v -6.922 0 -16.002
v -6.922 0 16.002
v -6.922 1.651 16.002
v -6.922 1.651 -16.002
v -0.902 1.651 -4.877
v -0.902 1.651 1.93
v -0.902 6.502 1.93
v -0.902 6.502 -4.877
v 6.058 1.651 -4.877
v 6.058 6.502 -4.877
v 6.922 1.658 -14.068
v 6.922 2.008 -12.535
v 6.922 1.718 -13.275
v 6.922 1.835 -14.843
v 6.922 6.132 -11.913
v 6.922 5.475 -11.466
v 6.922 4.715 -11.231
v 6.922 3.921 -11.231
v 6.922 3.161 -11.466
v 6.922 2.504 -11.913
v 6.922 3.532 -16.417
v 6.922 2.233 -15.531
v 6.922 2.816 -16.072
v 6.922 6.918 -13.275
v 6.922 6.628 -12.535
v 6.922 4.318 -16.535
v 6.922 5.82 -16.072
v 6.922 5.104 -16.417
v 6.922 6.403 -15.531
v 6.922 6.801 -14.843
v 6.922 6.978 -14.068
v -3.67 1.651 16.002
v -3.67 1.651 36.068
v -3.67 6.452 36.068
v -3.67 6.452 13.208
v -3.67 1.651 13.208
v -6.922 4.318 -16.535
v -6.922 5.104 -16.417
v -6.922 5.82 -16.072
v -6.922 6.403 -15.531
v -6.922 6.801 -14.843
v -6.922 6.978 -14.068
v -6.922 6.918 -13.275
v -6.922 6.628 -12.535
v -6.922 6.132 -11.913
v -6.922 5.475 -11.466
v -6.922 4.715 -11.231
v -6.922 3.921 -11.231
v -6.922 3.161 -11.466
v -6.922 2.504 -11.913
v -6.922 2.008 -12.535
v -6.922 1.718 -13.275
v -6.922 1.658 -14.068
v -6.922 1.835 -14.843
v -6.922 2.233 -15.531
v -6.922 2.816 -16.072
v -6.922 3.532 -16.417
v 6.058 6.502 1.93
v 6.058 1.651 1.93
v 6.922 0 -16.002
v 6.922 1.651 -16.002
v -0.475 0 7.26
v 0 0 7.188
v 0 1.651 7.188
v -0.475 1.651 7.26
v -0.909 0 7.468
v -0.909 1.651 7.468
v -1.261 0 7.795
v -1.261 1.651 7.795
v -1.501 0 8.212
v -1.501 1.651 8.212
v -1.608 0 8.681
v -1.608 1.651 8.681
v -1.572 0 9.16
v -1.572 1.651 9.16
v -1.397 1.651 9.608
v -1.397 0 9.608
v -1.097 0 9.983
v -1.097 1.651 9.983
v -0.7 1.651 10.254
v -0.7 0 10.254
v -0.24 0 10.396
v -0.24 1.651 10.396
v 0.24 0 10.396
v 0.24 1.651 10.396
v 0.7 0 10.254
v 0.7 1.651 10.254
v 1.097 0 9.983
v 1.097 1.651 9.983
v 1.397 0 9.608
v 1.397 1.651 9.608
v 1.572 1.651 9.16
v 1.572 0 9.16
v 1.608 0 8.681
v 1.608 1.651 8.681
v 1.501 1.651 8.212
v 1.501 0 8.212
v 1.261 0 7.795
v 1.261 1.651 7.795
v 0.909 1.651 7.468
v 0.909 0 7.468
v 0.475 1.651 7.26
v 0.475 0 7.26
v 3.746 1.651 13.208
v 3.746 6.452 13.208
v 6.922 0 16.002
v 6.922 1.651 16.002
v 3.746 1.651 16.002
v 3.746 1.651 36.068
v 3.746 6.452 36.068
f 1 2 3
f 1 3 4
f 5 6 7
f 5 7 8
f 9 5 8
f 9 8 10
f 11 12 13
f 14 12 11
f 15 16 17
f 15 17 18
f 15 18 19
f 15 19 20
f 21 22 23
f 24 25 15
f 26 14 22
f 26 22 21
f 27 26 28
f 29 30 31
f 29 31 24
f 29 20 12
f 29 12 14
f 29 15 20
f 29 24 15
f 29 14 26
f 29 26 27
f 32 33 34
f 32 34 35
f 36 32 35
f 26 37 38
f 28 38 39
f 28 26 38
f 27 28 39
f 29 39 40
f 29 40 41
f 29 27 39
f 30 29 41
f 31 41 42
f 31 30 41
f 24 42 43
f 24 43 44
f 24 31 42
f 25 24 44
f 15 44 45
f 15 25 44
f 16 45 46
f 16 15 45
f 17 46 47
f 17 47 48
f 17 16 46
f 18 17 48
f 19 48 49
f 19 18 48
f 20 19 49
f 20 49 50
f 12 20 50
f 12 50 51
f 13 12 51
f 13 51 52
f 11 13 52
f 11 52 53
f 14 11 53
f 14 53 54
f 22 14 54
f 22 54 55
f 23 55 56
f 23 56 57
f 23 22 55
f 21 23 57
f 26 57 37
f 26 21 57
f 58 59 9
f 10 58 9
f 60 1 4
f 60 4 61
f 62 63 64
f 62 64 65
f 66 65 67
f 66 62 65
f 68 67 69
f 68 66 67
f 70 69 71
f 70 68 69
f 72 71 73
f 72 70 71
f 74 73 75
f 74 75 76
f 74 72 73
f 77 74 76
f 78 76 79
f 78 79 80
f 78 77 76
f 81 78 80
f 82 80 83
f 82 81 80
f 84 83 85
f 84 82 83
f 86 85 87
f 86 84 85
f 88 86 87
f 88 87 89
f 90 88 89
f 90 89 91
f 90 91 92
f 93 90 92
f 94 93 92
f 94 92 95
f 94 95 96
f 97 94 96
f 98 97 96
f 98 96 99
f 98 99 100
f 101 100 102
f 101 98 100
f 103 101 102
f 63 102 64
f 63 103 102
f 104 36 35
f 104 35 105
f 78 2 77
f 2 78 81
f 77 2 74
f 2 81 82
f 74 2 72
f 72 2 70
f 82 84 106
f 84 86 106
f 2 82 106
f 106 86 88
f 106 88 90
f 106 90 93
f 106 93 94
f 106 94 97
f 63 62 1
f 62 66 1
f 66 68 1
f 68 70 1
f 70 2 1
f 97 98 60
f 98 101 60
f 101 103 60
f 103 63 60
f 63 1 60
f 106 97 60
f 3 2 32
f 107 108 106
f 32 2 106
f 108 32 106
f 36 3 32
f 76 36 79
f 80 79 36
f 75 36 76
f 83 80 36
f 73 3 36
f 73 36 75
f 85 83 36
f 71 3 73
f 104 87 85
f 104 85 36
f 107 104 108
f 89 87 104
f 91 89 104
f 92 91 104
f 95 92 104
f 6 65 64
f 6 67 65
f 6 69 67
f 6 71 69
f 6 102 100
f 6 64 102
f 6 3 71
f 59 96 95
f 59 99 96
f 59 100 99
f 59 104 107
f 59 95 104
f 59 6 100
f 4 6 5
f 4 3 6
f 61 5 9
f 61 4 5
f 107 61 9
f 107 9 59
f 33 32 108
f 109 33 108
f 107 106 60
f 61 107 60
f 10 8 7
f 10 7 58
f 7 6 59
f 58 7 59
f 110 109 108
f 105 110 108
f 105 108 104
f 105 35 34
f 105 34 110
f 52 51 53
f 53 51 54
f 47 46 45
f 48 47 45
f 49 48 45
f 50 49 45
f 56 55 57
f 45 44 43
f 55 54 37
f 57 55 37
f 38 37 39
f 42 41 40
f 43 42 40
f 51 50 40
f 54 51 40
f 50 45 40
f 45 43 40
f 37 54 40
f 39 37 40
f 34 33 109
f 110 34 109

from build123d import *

# Parameters (mm, degrees)
SKETCH1_W           = 13.843
SKETCH1_H           = 32.004
SKETCH1_R           = 1.6129
BOSS_EXTRUDE1_DEPTH = 1.651
SKETCH2_R           = 2.667
BOSS_EXTRUDE2_DEPTH = 13.843
SKETCH3_W           = 6.9596
SKETCH3_H           = 6.8072
BOSS_EXTRUDE3_DEPTH = 4.8514
SKETCH4_W           = 7.4168
SKETCH4_H           = 22.86
BOSS_EXTRUDE4_DEPTH = 4.8006


with BuildPart() as part:
    # Sketch1 → Boss-Extrude1 (new body)
    with BuildSketch(Plane(origin=(0, 0, 0), x_dir=(1, 0, 0), z_dir=(0, 1, 0))):
        Rectangle(SKETCH1_W, SKETCH1_H)
        with Locations(Location((0, -8.8011, 0), (0, 0, 90))):
            Circle(SKETCH1_R, mode=Mode.SUBTRACT)
    extrude(amount=BOSS_EXTRUDE1_DEPTH)

    # Sketch3 → Boss-Extrude3 (add)
    with BuildSketch(Plane(origin=(0, 1.651, 0), x_dir=(1, 0, 0), z_dir=(0, 1, 0))):
        with Locations((2.5781, 1.4732)):
            Rectangle(SKETCH3_W, SKETCH3_H)
    extrude(amount=BOSS_EXTRUDE3_DEPTH)

    # Sketch4 → Boss-Extrude4 (add)
    with BuildSketch(Plane(origin=(0, 1.651, 0), x_dir=(1, 0, 0), z_dir=(0, 1, 0))):
        with Locations((0.0381, -24.638)):
            Rectangle(SKETCH4_W, SKETCH4_H)
    extrude(amount=BOSS_EXTRUDE4_DEPTH)


with BuildPart() as body_2:
    # Sketch2 → Boss-Extrude2 (new body)
    with BuildSketch(Plane(origin=(6.9215, 0, 0), x_dir=(0, 0, -1), z_dir=(1, 0, 0))):
        with Locations((13.8684, 4.318)):
            Circle(SKETCH2_R)
    extrude(amount=-BOSS_EXTRUDE2_DEPTH)


solid = Compound([part.part, body_2.part])
